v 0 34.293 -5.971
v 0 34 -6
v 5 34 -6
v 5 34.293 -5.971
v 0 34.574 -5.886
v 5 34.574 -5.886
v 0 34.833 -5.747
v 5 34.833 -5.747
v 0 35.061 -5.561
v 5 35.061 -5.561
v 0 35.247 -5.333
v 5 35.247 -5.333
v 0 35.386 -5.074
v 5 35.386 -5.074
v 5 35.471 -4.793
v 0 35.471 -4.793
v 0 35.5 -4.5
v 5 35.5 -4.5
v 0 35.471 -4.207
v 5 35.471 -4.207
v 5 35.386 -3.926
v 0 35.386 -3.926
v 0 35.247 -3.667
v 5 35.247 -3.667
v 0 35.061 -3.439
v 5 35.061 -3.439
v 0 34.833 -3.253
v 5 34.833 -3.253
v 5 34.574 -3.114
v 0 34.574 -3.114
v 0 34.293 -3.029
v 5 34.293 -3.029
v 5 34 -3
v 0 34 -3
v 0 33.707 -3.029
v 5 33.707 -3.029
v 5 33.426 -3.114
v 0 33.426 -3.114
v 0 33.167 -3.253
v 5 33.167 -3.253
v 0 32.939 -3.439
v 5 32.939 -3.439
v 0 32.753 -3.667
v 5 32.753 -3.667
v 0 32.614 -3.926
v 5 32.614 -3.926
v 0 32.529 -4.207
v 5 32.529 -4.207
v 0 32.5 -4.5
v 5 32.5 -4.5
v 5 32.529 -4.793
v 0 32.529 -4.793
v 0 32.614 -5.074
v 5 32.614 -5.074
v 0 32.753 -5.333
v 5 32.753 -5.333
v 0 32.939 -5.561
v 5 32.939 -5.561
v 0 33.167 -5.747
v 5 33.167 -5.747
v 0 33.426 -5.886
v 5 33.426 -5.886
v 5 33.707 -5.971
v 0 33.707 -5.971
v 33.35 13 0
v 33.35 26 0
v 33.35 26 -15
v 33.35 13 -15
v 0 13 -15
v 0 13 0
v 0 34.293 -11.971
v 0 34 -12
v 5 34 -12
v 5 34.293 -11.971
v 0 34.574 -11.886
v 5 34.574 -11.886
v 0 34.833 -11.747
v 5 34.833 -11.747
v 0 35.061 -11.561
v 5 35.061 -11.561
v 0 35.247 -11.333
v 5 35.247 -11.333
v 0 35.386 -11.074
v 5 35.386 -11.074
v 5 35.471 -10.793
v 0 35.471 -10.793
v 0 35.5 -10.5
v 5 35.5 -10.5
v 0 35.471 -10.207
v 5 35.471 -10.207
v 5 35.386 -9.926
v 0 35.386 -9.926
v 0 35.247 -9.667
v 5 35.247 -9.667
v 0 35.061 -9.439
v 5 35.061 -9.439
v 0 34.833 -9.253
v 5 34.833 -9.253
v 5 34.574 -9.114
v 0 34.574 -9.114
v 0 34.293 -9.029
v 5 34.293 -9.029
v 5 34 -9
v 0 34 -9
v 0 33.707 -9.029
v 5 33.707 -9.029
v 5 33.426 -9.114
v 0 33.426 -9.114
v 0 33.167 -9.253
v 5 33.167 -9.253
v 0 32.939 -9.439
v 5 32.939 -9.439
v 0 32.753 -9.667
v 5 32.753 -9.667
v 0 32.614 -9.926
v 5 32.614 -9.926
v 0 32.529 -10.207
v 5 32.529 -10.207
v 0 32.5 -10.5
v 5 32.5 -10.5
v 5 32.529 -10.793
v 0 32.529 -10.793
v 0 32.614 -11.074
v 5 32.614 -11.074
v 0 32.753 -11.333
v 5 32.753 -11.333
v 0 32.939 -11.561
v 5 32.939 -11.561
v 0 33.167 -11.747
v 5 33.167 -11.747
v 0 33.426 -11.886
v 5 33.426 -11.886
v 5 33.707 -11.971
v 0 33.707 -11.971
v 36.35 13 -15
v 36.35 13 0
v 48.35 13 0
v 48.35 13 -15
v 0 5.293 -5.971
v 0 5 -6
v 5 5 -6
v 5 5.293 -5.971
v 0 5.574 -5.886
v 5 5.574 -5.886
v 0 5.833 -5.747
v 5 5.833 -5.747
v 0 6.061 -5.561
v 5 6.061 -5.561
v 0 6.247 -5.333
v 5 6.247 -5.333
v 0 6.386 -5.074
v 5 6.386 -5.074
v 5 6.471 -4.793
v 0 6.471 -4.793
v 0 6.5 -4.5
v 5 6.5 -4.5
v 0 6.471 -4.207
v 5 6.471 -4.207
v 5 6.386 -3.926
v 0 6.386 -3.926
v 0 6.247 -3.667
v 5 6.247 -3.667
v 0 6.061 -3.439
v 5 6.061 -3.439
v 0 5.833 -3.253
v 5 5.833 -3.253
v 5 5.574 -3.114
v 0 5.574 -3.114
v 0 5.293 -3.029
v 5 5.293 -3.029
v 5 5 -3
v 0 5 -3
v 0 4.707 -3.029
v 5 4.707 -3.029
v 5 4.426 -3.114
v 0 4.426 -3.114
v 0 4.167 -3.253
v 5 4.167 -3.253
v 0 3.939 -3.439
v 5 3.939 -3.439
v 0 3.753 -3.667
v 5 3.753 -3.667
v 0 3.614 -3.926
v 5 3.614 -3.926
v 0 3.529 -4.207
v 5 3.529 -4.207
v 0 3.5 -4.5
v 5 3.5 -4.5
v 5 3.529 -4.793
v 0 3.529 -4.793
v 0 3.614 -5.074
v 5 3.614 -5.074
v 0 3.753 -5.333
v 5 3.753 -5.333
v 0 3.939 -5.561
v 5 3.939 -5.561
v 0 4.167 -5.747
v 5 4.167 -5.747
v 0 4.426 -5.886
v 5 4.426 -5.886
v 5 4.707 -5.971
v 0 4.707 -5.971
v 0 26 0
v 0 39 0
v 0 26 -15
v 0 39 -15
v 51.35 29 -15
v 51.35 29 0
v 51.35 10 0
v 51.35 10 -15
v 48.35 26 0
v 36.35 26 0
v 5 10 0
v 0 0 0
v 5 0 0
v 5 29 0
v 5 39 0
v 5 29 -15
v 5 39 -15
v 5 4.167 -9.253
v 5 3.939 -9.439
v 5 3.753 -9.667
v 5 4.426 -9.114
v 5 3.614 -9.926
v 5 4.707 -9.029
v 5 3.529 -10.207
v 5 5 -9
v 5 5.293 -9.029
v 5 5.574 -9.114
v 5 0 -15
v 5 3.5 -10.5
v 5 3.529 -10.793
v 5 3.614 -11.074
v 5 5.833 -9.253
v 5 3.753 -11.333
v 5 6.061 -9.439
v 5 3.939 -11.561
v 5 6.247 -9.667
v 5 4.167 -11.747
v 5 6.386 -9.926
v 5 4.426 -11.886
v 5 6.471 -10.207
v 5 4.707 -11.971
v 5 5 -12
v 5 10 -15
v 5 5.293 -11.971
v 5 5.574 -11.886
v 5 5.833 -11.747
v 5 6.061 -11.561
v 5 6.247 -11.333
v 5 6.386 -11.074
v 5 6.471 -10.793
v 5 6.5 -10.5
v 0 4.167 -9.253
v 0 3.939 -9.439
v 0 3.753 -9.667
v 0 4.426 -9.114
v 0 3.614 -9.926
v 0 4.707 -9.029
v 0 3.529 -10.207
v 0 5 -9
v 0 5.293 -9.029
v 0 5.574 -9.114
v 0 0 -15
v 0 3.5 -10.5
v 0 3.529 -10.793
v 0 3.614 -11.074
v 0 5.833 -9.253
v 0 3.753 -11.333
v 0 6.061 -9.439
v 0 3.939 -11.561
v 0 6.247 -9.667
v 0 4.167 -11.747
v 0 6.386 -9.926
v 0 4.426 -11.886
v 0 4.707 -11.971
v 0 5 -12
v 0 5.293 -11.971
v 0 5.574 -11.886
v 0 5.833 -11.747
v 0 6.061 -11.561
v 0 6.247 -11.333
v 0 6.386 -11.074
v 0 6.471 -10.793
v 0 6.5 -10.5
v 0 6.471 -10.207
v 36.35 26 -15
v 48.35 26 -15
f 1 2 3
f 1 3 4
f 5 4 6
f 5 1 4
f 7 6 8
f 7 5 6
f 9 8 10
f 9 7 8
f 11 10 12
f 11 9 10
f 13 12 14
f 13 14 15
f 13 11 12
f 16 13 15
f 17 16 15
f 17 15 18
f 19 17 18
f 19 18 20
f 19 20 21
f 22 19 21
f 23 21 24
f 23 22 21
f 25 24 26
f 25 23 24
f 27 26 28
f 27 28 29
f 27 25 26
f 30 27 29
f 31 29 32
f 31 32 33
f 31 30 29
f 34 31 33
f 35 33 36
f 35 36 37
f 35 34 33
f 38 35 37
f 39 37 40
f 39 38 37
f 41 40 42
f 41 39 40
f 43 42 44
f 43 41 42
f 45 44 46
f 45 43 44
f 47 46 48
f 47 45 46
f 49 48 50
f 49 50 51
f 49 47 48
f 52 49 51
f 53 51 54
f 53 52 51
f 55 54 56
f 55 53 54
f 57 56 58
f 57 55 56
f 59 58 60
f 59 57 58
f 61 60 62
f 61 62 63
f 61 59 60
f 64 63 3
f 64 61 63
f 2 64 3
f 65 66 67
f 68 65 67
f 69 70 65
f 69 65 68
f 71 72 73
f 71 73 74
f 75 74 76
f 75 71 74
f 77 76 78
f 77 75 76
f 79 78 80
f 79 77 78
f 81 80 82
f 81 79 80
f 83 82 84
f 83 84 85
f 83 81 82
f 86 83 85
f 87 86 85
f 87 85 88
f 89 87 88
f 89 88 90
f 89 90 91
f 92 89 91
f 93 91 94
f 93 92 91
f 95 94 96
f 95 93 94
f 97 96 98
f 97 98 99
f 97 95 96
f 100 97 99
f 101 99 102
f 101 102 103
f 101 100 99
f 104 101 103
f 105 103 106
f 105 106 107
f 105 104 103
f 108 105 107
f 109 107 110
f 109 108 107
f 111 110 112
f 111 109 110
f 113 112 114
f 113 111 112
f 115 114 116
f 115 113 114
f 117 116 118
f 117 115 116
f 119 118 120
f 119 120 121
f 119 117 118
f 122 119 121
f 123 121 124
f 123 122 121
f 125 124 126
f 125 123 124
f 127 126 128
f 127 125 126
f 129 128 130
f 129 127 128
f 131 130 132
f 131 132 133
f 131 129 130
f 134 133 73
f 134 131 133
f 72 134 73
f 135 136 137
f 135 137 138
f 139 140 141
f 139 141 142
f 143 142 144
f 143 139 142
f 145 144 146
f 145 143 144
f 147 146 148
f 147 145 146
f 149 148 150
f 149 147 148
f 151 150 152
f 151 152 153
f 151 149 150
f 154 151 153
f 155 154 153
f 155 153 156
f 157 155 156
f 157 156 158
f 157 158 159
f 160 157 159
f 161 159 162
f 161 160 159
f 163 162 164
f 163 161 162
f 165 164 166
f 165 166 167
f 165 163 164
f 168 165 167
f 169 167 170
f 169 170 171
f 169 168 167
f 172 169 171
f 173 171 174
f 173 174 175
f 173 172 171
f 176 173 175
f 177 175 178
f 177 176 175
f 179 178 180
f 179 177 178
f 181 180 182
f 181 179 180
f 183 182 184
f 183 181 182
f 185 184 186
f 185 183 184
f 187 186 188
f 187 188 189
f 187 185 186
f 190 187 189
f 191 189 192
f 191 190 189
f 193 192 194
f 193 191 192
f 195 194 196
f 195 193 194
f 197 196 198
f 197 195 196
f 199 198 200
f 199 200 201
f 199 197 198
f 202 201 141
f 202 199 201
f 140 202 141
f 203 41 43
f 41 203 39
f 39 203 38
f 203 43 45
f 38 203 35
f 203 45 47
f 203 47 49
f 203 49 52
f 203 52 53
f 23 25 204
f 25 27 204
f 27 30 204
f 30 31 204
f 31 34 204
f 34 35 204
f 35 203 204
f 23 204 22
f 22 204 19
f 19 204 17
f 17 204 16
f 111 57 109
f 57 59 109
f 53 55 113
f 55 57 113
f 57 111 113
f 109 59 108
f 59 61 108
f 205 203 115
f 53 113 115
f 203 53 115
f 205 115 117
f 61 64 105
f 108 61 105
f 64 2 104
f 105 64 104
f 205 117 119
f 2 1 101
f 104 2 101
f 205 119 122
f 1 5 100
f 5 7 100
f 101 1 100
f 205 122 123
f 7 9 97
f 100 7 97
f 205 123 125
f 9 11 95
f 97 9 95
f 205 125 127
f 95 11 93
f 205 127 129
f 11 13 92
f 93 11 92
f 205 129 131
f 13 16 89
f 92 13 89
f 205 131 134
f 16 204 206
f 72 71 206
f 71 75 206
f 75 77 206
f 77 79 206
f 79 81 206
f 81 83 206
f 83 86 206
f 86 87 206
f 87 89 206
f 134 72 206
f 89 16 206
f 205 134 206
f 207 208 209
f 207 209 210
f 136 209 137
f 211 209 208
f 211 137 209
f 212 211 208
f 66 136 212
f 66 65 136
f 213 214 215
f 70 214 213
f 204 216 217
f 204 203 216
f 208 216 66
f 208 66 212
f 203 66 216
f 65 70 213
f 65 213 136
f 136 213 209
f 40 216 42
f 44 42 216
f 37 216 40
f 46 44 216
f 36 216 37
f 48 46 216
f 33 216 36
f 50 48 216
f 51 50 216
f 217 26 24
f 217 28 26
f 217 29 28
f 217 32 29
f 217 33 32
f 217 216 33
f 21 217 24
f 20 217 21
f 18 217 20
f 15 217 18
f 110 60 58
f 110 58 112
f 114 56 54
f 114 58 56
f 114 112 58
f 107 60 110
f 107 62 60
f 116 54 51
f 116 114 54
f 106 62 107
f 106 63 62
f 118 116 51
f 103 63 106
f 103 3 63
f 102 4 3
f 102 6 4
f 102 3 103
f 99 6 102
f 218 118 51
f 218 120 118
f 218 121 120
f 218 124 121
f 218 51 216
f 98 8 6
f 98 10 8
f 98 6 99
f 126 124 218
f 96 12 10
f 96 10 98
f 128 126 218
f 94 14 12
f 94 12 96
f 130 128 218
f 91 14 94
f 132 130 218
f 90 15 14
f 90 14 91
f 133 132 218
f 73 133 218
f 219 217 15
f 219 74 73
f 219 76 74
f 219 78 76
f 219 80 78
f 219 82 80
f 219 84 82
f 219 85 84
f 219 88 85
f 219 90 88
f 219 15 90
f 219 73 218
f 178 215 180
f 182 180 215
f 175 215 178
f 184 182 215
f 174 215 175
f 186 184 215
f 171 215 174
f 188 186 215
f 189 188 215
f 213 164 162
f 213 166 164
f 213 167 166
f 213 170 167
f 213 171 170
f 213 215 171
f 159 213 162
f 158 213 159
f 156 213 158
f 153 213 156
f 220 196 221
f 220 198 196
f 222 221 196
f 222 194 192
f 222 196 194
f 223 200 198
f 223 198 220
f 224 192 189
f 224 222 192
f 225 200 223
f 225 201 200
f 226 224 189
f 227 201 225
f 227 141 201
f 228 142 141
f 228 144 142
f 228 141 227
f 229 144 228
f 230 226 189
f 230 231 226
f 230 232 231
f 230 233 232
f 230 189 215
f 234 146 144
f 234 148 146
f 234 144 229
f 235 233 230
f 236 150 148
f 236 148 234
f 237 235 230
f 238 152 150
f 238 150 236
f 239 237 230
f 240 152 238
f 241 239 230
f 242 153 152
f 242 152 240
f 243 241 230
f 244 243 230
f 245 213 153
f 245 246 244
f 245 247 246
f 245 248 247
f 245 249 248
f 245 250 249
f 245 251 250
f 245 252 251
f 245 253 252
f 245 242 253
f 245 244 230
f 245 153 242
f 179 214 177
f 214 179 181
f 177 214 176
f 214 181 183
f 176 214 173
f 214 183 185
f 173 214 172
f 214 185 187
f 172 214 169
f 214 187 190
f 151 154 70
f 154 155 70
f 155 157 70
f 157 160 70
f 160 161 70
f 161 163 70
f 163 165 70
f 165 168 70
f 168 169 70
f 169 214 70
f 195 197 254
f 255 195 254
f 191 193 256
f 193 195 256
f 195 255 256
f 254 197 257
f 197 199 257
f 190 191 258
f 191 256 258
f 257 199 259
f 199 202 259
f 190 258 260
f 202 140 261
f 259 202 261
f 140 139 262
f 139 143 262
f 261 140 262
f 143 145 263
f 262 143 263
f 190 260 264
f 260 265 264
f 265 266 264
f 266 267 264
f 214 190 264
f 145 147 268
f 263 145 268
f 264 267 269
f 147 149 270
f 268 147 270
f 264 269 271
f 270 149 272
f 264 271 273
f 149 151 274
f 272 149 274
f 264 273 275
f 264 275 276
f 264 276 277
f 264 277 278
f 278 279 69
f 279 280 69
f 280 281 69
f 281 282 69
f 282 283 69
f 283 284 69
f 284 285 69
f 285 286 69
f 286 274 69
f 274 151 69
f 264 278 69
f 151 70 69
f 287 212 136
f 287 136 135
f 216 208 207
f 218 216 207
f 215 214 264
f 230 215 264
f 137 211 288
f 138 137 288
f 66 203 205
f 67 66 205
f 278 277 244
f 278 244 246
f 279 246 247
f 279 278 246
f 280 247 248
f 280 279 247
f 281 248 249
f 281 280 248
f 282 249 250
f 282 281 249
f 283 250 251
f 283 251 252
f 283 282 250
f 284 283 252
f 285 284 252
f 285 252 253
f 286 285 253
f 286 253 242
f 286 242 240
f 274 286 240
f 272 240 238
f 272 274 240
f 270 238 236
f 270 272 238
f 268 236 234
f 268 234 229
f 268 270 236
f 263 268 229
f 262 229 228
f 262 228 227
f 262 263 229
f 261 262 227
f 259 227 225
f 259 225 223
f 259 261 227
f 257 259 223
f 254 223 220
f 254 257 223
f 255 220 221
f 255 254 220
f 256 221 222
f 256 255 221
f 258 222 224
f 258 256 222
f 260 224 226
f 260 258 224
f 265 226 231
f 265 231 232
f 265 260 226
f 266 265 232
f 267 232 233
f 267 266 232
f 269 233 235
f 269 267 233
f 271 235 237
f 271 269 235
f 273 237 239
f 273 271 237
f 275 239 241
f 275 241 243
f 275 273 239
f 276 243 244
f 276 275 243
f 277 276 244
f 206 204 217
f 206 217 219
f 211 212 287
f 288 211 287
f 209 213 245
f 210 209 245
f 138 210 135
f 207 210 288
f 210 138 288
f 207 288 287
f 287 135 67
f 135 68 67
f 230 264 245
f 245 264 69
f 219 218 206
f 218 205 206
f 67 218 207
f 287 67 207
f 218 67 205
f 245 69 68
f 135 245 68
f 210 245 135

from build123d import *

# Parameters (mm, degrees)
SKETCH1_W             = 15
SKETCH1_H             = 13
SKETCH1_R             = 1.5
BOSS_EXTRUDE1_DEPTH   = 5
BOSS_EXTRUDE1_2_DEPTH = 5
SKETCH2_W             = 15
SKETCH2_H             = 3
BOSS_EXTRUDE2_DEPTH   = 43.35
SKETCH3_W             = 15
SKETCH3_H             = 19
BOSS_EXTRUDE3_DEPTH   = 3
BOSS_EXTRUDE5_START   = -15
SKETCH5_W             = 15
SKETCH5_H             = 19
BOSS_EXTRUDE5_DEPTH   = 3


with BuildPart() as part:
    # Sketch1 → Boss-Extrude1 (new body)
    with BuildSketch(Plane(origin=(0, 0, 0), x_dir=(0, 0, -1), z_dir=(1, 0, 0))):
        with Locations((7.5, 6.5)):
            Rectangle(SKETCH1_W, SKETCH1_H)
        with Locations((4.5, 5)):
            Circle(SKETCH1_R, mode=Mode.SUBTRACT)
        with Locations((10.5, 5)):
            Circle(SKETCH1_R, mode=Mode.SUBTRACT)
    extrude(amount=BOSS_EXTRUDE1_DEPTH)



with BuildPart() as body_2:
    # Sketch1 → Boss-Extrude1 2 (new body)
    with BuildSketch(Plane(origin=(0, 0, 0), x_dir=(0, 0, -1), z_dir=(1, 0, 0))):
        with Locations((7.5, 32.5)):
            Rectangle(SKETCH1_W, SKETCH1_H)
        with Locations((4.5, 34)):
            Circle(SKETCH1_R, mode=Mode.SUBTRACT)
        with Locations((10.5, 34)):
            Circle(SKETCH1_R, mode=Mode.SUBTRACT)
    extrude(amount=BOSS_EXTRUDE1_2_DEPTH)


with BuildPart() as part_1:
    add(part.part)

    add(body_2.part)  # Boss-Extrude2 merges body 2
    # Sketch2 → Boss-Extrude2 (add)
    with BuildSketch(Plane(origin=(5, 0, 0), x_dir=(0, 0, -1), z_dir=(1, 0, 0))):
        with Locations((7.5, 27.5)):
            Rectangle(SKETCH2_W, SKETCH2_H)
        with Locations((7.5, 11.5)):
            Rectangle(SKETCH2_W, SKETCH2_H)
    extrude(amount=BOSS_EXTRUDE2_DEPTH)

    # Sketch3 → Boss-Extrude3 (add)
    with BuildSketch(Plane(origin=(48.35, 0, 0), x_dir=(0, 0, -1), z_dir=(1, 0, 0))):
        with Locations((7.5, 19.5)):
            Rectangle(SKETCH3_W, SKETCH3_H)
    extrude(amount=BOSS_EXTRUDE3_DEPTH)

    # Sketch5 → Boss-Extrude5 (add)
    with BuildSketch(Plane(origin=(51.35, 0, 0), x_dir=(0, 0, -1), z_dir=(1, 0, 0)).offset(BOSS_EXTRUDE5_START)):
        with Locations((7.5, 19.5)):
            Rectangle(SKETCH5_W, SKETCH5_H)
    extrude(amount=-BOSS_EXTRUDE5_DEPTH)


solid = part_1.part
